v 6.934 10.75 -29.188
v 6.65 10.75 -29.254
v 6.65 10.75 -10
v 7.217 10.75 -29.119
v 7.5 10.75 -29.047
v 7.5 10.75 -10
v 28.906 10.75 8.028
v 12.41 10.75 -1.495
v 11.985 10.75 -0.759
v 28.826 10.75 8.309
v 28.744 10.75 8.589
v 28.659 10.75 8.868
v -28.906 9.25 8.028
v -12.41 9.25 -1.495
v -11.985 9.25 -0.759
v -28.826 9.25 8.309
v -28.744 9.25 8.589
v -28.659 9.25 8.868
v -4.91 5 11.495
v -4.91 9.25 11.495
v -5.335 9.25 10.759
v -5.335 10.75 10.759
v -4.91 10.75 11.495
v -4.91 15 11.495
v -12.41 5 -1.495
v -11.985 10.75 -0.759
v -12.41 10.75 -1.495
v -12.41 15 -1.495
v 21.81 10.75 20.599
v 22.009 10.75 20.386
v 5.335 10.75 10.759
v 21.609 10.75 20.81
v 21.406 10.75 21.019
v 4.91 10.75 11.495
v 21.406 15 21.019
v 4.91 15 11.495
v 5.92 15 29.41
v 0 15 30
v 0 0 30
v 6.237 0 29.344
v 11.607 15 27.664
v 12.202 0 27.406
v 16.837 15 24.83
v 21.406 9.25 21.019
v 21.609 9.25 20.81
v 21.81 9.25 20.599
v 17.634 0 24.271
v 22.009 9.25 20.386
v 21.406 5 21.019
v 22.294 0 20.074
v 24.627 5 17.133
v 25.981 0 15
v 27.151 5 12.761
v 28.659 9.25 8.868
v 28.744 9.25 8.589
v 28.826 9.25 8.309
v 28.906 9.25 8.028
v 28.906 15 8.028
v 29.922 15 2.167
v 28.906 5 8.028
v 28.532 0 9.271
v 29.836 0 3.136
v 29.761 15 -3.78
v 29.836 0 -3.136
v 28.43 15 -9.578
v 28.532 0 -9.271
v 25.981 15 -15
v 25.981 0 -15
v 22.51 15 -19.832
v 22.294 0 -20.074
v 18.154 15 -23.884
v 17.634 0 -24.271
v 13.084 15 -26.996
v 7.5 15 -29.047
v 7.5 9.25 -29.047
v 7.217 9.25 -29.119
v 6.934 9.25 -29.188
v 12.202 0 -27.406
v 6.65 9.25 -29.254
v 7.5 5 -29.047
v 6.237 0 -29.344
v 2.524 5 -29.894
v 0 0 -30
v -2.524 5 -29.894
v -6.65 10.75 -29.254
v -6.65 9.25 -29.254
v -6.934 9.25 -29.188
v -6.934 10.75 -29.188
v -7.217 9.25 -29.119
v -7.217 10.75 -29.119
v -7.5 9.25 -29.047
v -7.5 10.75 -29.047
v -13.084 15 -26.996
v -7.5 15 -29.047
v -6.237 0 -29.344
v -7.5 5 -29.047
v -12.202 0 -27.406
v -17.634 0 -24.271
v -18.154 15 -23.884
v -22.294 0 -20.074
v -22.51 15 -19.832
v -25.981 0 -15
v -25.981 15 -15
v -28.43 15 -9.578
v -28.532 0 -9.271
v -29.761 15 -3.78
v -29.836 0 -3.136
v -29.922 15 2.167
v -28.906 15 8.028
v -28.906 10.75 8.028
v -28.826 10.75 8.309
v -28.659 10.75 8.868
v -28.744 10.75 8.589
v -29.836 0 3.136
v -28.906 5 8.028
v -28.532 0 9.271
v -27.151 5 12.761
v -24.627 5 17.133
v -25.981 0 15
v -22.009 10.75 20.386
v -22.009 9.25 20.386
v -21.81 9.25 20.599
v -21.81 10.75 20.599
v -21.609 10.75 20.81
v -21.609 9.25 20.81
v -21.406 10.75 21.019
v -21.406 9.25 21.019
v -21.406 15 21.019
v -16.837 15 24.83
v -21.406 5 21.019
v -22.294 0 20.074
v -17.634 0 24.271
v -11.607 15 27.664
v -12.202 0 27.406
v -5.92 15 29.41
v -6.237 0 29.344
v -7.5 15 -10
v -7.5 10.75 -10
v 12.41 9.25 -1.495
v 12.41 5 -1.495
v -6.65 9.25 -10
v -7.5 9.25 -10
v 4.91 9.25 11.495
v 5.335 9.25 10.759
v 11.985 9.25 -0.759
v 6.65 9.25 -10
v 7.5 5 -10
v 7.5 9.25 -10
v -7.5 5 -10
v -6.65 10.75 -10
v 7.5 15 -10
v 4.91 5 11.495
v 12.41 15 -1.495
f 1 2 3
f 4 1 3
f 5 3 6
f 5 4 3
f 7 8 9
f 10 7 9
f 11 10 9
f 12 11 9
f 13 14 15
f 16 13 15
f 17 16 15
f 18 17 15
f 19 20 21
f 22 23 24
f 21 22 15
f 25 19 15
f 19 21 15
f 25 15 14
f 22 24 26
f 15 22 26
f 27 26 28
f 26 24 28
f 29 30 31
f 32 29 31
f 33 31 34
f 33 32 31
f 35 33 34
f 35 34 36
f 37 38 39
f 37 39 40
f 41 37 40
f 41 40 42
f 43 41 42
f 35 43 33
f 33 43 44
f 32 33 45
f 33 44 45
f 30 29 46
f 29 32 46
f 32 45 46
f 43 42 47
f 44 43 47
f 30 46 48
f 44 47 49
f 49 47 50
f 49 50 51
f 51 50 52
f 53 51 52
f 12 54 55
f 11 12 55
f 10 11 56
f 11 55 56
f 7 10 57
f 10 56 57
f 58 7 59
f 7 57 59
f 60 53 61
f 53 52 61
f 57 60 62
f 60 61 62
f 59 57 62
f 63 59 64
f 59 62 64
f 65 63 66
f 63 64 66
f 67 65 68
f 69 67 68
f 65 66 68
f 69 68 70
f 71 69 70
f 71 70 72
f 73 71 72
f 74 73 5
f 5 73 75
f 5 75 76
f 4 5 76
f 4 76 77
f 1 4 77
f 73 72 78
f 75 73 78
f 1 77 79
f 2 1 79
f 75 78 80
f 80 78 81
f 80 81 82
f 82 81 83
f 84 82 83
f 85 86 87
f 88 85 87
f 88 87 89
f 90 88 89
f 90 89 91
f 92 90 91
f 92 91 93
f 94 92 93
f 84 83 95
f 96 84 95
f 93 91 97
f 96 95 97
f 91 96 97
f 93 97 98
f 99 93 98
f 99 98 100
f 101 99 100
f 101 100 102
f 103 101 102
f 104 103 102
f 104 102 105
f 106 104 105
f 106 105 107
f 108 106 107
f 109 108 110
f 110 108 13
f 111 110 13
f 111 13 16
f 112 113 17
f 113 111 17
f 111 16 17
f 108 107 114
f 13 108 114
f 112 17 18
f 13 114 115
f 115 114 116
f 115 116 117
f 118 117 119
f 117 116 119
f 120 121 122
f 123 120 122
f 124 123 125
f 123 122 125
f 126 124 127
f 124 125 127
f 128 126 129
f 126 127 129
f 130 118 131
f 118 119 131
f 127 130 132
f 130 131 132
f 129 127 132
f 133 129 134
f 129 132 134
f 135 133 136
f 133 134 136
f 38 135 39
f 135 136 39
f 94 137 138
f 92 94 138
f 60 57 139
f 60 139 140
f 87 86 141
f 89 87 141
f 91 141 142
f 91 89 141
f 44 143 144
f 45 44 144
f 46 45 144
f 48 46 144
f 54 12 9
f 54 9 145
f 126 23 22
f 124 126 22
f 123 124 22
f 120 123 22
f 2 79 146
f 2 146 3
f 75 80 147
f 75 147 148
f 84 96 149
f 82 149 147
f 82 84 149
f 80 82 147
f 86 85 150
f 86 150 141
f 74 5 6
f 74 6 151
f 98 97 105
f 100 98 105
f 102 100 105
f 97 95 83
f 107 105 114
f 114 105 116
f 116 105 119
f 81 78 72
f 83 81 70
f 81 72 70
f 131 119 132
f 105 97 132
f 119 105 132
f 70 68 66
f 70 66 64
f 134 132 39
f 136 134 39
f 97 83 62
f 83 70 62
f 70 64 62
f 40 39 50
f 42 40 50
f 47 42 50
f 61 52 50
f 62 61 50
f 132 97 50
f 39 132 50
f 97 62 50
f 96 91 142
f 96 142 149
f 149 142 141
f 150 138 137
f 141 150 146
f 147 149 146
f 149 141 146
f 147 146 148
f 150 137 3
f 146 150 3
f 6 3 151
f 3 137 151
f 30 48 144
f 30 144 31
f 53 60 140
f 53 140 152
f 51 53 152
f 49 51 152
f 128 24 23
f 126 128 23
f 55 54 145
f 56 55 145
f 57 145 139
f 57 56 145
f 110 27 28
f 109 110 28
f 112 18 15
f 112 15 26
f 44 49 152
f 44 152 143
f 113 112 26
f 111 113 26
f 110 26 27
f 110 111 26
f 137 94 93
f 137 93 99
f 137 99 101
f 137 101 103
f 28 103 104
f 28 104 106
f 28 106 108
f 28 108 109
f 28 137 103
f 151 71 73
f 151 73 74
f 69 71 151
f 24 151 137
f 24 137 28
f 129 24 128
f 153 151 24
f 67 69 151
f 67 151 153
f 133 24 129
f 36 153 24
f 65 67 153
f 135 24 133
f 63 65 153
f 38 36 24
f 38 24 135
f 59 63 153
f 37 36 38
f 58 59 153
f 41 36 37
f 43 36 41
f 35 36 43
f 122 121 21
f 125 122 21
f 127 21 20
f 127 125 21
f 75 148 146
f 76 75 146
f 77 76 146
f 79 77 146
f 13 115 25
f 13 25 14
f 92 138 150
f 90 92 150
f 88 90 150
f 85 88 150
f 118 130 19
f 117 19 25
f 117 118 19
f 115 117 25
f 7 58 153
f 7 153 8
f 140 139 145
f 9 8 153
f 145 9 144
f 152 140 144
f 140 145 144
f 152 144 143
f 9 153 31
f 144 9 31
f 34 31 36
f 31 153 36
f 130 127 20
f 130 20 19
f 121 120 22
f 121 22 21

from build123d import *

# Parameters (mm, degrees)
SKETCH1_R           = 30
BOSS_EXTRUDE1_DEPTH = 15
CUT_EXTRUDE1_DEPTH  = 20
CIRPATTERN1_COUNT   = 3


with BuildPart() as part:
    # Sketch1 → Boss-Extrude1 (new body)
    with BuildSketch(Plane(origin=(0, 0, 0), x_dir=(1, 0, 0), z_dir=(0, 1, 0))):
        with Locations(Location((0, 0, 0), (0, 0, 270))):
            Circle(SKETCH1_R)
    extrude(amount=BOSS_EXTRUDE1_DEPTH)

    # Sketch4 → Cut-Extrude1 (cut)
    with BuildSketch(Plane(origin=(0, 15, -30), x_dir=(-1, 0, 0), z_dir=(0, 0, -1))):
        Polygon((-7.5, -10), (-7.5, -5.75), (-6.65, -5.75), (-6.65, -4.25), (-7.5, -4.25), (-7.5, 0), (7.5, 0), (7.5, -4.25), (6.65, -4.25), (6.65, -5.75), (7.5, -5.75), (7.5, -10), align=None)
    cut_extrude1 = extrude(amount=-CUT_EXTRUDE1_DEPTH, mode=Mode.SUBTRACT)

    # CirPattern1: Cut-Extrude1 ×3 about axis
    cirpattern1_axis = Axis((0, 0, 0), (0, 1, 0))
    for i in range(1, CIRPATTERN1_COUNT):
        add(cut_extrude1.rotate(cirpattern1_axis, i * 360 / CIRPATTERN1_COUNT), mode=Mode.SUBTRACT)


solid = part.part
